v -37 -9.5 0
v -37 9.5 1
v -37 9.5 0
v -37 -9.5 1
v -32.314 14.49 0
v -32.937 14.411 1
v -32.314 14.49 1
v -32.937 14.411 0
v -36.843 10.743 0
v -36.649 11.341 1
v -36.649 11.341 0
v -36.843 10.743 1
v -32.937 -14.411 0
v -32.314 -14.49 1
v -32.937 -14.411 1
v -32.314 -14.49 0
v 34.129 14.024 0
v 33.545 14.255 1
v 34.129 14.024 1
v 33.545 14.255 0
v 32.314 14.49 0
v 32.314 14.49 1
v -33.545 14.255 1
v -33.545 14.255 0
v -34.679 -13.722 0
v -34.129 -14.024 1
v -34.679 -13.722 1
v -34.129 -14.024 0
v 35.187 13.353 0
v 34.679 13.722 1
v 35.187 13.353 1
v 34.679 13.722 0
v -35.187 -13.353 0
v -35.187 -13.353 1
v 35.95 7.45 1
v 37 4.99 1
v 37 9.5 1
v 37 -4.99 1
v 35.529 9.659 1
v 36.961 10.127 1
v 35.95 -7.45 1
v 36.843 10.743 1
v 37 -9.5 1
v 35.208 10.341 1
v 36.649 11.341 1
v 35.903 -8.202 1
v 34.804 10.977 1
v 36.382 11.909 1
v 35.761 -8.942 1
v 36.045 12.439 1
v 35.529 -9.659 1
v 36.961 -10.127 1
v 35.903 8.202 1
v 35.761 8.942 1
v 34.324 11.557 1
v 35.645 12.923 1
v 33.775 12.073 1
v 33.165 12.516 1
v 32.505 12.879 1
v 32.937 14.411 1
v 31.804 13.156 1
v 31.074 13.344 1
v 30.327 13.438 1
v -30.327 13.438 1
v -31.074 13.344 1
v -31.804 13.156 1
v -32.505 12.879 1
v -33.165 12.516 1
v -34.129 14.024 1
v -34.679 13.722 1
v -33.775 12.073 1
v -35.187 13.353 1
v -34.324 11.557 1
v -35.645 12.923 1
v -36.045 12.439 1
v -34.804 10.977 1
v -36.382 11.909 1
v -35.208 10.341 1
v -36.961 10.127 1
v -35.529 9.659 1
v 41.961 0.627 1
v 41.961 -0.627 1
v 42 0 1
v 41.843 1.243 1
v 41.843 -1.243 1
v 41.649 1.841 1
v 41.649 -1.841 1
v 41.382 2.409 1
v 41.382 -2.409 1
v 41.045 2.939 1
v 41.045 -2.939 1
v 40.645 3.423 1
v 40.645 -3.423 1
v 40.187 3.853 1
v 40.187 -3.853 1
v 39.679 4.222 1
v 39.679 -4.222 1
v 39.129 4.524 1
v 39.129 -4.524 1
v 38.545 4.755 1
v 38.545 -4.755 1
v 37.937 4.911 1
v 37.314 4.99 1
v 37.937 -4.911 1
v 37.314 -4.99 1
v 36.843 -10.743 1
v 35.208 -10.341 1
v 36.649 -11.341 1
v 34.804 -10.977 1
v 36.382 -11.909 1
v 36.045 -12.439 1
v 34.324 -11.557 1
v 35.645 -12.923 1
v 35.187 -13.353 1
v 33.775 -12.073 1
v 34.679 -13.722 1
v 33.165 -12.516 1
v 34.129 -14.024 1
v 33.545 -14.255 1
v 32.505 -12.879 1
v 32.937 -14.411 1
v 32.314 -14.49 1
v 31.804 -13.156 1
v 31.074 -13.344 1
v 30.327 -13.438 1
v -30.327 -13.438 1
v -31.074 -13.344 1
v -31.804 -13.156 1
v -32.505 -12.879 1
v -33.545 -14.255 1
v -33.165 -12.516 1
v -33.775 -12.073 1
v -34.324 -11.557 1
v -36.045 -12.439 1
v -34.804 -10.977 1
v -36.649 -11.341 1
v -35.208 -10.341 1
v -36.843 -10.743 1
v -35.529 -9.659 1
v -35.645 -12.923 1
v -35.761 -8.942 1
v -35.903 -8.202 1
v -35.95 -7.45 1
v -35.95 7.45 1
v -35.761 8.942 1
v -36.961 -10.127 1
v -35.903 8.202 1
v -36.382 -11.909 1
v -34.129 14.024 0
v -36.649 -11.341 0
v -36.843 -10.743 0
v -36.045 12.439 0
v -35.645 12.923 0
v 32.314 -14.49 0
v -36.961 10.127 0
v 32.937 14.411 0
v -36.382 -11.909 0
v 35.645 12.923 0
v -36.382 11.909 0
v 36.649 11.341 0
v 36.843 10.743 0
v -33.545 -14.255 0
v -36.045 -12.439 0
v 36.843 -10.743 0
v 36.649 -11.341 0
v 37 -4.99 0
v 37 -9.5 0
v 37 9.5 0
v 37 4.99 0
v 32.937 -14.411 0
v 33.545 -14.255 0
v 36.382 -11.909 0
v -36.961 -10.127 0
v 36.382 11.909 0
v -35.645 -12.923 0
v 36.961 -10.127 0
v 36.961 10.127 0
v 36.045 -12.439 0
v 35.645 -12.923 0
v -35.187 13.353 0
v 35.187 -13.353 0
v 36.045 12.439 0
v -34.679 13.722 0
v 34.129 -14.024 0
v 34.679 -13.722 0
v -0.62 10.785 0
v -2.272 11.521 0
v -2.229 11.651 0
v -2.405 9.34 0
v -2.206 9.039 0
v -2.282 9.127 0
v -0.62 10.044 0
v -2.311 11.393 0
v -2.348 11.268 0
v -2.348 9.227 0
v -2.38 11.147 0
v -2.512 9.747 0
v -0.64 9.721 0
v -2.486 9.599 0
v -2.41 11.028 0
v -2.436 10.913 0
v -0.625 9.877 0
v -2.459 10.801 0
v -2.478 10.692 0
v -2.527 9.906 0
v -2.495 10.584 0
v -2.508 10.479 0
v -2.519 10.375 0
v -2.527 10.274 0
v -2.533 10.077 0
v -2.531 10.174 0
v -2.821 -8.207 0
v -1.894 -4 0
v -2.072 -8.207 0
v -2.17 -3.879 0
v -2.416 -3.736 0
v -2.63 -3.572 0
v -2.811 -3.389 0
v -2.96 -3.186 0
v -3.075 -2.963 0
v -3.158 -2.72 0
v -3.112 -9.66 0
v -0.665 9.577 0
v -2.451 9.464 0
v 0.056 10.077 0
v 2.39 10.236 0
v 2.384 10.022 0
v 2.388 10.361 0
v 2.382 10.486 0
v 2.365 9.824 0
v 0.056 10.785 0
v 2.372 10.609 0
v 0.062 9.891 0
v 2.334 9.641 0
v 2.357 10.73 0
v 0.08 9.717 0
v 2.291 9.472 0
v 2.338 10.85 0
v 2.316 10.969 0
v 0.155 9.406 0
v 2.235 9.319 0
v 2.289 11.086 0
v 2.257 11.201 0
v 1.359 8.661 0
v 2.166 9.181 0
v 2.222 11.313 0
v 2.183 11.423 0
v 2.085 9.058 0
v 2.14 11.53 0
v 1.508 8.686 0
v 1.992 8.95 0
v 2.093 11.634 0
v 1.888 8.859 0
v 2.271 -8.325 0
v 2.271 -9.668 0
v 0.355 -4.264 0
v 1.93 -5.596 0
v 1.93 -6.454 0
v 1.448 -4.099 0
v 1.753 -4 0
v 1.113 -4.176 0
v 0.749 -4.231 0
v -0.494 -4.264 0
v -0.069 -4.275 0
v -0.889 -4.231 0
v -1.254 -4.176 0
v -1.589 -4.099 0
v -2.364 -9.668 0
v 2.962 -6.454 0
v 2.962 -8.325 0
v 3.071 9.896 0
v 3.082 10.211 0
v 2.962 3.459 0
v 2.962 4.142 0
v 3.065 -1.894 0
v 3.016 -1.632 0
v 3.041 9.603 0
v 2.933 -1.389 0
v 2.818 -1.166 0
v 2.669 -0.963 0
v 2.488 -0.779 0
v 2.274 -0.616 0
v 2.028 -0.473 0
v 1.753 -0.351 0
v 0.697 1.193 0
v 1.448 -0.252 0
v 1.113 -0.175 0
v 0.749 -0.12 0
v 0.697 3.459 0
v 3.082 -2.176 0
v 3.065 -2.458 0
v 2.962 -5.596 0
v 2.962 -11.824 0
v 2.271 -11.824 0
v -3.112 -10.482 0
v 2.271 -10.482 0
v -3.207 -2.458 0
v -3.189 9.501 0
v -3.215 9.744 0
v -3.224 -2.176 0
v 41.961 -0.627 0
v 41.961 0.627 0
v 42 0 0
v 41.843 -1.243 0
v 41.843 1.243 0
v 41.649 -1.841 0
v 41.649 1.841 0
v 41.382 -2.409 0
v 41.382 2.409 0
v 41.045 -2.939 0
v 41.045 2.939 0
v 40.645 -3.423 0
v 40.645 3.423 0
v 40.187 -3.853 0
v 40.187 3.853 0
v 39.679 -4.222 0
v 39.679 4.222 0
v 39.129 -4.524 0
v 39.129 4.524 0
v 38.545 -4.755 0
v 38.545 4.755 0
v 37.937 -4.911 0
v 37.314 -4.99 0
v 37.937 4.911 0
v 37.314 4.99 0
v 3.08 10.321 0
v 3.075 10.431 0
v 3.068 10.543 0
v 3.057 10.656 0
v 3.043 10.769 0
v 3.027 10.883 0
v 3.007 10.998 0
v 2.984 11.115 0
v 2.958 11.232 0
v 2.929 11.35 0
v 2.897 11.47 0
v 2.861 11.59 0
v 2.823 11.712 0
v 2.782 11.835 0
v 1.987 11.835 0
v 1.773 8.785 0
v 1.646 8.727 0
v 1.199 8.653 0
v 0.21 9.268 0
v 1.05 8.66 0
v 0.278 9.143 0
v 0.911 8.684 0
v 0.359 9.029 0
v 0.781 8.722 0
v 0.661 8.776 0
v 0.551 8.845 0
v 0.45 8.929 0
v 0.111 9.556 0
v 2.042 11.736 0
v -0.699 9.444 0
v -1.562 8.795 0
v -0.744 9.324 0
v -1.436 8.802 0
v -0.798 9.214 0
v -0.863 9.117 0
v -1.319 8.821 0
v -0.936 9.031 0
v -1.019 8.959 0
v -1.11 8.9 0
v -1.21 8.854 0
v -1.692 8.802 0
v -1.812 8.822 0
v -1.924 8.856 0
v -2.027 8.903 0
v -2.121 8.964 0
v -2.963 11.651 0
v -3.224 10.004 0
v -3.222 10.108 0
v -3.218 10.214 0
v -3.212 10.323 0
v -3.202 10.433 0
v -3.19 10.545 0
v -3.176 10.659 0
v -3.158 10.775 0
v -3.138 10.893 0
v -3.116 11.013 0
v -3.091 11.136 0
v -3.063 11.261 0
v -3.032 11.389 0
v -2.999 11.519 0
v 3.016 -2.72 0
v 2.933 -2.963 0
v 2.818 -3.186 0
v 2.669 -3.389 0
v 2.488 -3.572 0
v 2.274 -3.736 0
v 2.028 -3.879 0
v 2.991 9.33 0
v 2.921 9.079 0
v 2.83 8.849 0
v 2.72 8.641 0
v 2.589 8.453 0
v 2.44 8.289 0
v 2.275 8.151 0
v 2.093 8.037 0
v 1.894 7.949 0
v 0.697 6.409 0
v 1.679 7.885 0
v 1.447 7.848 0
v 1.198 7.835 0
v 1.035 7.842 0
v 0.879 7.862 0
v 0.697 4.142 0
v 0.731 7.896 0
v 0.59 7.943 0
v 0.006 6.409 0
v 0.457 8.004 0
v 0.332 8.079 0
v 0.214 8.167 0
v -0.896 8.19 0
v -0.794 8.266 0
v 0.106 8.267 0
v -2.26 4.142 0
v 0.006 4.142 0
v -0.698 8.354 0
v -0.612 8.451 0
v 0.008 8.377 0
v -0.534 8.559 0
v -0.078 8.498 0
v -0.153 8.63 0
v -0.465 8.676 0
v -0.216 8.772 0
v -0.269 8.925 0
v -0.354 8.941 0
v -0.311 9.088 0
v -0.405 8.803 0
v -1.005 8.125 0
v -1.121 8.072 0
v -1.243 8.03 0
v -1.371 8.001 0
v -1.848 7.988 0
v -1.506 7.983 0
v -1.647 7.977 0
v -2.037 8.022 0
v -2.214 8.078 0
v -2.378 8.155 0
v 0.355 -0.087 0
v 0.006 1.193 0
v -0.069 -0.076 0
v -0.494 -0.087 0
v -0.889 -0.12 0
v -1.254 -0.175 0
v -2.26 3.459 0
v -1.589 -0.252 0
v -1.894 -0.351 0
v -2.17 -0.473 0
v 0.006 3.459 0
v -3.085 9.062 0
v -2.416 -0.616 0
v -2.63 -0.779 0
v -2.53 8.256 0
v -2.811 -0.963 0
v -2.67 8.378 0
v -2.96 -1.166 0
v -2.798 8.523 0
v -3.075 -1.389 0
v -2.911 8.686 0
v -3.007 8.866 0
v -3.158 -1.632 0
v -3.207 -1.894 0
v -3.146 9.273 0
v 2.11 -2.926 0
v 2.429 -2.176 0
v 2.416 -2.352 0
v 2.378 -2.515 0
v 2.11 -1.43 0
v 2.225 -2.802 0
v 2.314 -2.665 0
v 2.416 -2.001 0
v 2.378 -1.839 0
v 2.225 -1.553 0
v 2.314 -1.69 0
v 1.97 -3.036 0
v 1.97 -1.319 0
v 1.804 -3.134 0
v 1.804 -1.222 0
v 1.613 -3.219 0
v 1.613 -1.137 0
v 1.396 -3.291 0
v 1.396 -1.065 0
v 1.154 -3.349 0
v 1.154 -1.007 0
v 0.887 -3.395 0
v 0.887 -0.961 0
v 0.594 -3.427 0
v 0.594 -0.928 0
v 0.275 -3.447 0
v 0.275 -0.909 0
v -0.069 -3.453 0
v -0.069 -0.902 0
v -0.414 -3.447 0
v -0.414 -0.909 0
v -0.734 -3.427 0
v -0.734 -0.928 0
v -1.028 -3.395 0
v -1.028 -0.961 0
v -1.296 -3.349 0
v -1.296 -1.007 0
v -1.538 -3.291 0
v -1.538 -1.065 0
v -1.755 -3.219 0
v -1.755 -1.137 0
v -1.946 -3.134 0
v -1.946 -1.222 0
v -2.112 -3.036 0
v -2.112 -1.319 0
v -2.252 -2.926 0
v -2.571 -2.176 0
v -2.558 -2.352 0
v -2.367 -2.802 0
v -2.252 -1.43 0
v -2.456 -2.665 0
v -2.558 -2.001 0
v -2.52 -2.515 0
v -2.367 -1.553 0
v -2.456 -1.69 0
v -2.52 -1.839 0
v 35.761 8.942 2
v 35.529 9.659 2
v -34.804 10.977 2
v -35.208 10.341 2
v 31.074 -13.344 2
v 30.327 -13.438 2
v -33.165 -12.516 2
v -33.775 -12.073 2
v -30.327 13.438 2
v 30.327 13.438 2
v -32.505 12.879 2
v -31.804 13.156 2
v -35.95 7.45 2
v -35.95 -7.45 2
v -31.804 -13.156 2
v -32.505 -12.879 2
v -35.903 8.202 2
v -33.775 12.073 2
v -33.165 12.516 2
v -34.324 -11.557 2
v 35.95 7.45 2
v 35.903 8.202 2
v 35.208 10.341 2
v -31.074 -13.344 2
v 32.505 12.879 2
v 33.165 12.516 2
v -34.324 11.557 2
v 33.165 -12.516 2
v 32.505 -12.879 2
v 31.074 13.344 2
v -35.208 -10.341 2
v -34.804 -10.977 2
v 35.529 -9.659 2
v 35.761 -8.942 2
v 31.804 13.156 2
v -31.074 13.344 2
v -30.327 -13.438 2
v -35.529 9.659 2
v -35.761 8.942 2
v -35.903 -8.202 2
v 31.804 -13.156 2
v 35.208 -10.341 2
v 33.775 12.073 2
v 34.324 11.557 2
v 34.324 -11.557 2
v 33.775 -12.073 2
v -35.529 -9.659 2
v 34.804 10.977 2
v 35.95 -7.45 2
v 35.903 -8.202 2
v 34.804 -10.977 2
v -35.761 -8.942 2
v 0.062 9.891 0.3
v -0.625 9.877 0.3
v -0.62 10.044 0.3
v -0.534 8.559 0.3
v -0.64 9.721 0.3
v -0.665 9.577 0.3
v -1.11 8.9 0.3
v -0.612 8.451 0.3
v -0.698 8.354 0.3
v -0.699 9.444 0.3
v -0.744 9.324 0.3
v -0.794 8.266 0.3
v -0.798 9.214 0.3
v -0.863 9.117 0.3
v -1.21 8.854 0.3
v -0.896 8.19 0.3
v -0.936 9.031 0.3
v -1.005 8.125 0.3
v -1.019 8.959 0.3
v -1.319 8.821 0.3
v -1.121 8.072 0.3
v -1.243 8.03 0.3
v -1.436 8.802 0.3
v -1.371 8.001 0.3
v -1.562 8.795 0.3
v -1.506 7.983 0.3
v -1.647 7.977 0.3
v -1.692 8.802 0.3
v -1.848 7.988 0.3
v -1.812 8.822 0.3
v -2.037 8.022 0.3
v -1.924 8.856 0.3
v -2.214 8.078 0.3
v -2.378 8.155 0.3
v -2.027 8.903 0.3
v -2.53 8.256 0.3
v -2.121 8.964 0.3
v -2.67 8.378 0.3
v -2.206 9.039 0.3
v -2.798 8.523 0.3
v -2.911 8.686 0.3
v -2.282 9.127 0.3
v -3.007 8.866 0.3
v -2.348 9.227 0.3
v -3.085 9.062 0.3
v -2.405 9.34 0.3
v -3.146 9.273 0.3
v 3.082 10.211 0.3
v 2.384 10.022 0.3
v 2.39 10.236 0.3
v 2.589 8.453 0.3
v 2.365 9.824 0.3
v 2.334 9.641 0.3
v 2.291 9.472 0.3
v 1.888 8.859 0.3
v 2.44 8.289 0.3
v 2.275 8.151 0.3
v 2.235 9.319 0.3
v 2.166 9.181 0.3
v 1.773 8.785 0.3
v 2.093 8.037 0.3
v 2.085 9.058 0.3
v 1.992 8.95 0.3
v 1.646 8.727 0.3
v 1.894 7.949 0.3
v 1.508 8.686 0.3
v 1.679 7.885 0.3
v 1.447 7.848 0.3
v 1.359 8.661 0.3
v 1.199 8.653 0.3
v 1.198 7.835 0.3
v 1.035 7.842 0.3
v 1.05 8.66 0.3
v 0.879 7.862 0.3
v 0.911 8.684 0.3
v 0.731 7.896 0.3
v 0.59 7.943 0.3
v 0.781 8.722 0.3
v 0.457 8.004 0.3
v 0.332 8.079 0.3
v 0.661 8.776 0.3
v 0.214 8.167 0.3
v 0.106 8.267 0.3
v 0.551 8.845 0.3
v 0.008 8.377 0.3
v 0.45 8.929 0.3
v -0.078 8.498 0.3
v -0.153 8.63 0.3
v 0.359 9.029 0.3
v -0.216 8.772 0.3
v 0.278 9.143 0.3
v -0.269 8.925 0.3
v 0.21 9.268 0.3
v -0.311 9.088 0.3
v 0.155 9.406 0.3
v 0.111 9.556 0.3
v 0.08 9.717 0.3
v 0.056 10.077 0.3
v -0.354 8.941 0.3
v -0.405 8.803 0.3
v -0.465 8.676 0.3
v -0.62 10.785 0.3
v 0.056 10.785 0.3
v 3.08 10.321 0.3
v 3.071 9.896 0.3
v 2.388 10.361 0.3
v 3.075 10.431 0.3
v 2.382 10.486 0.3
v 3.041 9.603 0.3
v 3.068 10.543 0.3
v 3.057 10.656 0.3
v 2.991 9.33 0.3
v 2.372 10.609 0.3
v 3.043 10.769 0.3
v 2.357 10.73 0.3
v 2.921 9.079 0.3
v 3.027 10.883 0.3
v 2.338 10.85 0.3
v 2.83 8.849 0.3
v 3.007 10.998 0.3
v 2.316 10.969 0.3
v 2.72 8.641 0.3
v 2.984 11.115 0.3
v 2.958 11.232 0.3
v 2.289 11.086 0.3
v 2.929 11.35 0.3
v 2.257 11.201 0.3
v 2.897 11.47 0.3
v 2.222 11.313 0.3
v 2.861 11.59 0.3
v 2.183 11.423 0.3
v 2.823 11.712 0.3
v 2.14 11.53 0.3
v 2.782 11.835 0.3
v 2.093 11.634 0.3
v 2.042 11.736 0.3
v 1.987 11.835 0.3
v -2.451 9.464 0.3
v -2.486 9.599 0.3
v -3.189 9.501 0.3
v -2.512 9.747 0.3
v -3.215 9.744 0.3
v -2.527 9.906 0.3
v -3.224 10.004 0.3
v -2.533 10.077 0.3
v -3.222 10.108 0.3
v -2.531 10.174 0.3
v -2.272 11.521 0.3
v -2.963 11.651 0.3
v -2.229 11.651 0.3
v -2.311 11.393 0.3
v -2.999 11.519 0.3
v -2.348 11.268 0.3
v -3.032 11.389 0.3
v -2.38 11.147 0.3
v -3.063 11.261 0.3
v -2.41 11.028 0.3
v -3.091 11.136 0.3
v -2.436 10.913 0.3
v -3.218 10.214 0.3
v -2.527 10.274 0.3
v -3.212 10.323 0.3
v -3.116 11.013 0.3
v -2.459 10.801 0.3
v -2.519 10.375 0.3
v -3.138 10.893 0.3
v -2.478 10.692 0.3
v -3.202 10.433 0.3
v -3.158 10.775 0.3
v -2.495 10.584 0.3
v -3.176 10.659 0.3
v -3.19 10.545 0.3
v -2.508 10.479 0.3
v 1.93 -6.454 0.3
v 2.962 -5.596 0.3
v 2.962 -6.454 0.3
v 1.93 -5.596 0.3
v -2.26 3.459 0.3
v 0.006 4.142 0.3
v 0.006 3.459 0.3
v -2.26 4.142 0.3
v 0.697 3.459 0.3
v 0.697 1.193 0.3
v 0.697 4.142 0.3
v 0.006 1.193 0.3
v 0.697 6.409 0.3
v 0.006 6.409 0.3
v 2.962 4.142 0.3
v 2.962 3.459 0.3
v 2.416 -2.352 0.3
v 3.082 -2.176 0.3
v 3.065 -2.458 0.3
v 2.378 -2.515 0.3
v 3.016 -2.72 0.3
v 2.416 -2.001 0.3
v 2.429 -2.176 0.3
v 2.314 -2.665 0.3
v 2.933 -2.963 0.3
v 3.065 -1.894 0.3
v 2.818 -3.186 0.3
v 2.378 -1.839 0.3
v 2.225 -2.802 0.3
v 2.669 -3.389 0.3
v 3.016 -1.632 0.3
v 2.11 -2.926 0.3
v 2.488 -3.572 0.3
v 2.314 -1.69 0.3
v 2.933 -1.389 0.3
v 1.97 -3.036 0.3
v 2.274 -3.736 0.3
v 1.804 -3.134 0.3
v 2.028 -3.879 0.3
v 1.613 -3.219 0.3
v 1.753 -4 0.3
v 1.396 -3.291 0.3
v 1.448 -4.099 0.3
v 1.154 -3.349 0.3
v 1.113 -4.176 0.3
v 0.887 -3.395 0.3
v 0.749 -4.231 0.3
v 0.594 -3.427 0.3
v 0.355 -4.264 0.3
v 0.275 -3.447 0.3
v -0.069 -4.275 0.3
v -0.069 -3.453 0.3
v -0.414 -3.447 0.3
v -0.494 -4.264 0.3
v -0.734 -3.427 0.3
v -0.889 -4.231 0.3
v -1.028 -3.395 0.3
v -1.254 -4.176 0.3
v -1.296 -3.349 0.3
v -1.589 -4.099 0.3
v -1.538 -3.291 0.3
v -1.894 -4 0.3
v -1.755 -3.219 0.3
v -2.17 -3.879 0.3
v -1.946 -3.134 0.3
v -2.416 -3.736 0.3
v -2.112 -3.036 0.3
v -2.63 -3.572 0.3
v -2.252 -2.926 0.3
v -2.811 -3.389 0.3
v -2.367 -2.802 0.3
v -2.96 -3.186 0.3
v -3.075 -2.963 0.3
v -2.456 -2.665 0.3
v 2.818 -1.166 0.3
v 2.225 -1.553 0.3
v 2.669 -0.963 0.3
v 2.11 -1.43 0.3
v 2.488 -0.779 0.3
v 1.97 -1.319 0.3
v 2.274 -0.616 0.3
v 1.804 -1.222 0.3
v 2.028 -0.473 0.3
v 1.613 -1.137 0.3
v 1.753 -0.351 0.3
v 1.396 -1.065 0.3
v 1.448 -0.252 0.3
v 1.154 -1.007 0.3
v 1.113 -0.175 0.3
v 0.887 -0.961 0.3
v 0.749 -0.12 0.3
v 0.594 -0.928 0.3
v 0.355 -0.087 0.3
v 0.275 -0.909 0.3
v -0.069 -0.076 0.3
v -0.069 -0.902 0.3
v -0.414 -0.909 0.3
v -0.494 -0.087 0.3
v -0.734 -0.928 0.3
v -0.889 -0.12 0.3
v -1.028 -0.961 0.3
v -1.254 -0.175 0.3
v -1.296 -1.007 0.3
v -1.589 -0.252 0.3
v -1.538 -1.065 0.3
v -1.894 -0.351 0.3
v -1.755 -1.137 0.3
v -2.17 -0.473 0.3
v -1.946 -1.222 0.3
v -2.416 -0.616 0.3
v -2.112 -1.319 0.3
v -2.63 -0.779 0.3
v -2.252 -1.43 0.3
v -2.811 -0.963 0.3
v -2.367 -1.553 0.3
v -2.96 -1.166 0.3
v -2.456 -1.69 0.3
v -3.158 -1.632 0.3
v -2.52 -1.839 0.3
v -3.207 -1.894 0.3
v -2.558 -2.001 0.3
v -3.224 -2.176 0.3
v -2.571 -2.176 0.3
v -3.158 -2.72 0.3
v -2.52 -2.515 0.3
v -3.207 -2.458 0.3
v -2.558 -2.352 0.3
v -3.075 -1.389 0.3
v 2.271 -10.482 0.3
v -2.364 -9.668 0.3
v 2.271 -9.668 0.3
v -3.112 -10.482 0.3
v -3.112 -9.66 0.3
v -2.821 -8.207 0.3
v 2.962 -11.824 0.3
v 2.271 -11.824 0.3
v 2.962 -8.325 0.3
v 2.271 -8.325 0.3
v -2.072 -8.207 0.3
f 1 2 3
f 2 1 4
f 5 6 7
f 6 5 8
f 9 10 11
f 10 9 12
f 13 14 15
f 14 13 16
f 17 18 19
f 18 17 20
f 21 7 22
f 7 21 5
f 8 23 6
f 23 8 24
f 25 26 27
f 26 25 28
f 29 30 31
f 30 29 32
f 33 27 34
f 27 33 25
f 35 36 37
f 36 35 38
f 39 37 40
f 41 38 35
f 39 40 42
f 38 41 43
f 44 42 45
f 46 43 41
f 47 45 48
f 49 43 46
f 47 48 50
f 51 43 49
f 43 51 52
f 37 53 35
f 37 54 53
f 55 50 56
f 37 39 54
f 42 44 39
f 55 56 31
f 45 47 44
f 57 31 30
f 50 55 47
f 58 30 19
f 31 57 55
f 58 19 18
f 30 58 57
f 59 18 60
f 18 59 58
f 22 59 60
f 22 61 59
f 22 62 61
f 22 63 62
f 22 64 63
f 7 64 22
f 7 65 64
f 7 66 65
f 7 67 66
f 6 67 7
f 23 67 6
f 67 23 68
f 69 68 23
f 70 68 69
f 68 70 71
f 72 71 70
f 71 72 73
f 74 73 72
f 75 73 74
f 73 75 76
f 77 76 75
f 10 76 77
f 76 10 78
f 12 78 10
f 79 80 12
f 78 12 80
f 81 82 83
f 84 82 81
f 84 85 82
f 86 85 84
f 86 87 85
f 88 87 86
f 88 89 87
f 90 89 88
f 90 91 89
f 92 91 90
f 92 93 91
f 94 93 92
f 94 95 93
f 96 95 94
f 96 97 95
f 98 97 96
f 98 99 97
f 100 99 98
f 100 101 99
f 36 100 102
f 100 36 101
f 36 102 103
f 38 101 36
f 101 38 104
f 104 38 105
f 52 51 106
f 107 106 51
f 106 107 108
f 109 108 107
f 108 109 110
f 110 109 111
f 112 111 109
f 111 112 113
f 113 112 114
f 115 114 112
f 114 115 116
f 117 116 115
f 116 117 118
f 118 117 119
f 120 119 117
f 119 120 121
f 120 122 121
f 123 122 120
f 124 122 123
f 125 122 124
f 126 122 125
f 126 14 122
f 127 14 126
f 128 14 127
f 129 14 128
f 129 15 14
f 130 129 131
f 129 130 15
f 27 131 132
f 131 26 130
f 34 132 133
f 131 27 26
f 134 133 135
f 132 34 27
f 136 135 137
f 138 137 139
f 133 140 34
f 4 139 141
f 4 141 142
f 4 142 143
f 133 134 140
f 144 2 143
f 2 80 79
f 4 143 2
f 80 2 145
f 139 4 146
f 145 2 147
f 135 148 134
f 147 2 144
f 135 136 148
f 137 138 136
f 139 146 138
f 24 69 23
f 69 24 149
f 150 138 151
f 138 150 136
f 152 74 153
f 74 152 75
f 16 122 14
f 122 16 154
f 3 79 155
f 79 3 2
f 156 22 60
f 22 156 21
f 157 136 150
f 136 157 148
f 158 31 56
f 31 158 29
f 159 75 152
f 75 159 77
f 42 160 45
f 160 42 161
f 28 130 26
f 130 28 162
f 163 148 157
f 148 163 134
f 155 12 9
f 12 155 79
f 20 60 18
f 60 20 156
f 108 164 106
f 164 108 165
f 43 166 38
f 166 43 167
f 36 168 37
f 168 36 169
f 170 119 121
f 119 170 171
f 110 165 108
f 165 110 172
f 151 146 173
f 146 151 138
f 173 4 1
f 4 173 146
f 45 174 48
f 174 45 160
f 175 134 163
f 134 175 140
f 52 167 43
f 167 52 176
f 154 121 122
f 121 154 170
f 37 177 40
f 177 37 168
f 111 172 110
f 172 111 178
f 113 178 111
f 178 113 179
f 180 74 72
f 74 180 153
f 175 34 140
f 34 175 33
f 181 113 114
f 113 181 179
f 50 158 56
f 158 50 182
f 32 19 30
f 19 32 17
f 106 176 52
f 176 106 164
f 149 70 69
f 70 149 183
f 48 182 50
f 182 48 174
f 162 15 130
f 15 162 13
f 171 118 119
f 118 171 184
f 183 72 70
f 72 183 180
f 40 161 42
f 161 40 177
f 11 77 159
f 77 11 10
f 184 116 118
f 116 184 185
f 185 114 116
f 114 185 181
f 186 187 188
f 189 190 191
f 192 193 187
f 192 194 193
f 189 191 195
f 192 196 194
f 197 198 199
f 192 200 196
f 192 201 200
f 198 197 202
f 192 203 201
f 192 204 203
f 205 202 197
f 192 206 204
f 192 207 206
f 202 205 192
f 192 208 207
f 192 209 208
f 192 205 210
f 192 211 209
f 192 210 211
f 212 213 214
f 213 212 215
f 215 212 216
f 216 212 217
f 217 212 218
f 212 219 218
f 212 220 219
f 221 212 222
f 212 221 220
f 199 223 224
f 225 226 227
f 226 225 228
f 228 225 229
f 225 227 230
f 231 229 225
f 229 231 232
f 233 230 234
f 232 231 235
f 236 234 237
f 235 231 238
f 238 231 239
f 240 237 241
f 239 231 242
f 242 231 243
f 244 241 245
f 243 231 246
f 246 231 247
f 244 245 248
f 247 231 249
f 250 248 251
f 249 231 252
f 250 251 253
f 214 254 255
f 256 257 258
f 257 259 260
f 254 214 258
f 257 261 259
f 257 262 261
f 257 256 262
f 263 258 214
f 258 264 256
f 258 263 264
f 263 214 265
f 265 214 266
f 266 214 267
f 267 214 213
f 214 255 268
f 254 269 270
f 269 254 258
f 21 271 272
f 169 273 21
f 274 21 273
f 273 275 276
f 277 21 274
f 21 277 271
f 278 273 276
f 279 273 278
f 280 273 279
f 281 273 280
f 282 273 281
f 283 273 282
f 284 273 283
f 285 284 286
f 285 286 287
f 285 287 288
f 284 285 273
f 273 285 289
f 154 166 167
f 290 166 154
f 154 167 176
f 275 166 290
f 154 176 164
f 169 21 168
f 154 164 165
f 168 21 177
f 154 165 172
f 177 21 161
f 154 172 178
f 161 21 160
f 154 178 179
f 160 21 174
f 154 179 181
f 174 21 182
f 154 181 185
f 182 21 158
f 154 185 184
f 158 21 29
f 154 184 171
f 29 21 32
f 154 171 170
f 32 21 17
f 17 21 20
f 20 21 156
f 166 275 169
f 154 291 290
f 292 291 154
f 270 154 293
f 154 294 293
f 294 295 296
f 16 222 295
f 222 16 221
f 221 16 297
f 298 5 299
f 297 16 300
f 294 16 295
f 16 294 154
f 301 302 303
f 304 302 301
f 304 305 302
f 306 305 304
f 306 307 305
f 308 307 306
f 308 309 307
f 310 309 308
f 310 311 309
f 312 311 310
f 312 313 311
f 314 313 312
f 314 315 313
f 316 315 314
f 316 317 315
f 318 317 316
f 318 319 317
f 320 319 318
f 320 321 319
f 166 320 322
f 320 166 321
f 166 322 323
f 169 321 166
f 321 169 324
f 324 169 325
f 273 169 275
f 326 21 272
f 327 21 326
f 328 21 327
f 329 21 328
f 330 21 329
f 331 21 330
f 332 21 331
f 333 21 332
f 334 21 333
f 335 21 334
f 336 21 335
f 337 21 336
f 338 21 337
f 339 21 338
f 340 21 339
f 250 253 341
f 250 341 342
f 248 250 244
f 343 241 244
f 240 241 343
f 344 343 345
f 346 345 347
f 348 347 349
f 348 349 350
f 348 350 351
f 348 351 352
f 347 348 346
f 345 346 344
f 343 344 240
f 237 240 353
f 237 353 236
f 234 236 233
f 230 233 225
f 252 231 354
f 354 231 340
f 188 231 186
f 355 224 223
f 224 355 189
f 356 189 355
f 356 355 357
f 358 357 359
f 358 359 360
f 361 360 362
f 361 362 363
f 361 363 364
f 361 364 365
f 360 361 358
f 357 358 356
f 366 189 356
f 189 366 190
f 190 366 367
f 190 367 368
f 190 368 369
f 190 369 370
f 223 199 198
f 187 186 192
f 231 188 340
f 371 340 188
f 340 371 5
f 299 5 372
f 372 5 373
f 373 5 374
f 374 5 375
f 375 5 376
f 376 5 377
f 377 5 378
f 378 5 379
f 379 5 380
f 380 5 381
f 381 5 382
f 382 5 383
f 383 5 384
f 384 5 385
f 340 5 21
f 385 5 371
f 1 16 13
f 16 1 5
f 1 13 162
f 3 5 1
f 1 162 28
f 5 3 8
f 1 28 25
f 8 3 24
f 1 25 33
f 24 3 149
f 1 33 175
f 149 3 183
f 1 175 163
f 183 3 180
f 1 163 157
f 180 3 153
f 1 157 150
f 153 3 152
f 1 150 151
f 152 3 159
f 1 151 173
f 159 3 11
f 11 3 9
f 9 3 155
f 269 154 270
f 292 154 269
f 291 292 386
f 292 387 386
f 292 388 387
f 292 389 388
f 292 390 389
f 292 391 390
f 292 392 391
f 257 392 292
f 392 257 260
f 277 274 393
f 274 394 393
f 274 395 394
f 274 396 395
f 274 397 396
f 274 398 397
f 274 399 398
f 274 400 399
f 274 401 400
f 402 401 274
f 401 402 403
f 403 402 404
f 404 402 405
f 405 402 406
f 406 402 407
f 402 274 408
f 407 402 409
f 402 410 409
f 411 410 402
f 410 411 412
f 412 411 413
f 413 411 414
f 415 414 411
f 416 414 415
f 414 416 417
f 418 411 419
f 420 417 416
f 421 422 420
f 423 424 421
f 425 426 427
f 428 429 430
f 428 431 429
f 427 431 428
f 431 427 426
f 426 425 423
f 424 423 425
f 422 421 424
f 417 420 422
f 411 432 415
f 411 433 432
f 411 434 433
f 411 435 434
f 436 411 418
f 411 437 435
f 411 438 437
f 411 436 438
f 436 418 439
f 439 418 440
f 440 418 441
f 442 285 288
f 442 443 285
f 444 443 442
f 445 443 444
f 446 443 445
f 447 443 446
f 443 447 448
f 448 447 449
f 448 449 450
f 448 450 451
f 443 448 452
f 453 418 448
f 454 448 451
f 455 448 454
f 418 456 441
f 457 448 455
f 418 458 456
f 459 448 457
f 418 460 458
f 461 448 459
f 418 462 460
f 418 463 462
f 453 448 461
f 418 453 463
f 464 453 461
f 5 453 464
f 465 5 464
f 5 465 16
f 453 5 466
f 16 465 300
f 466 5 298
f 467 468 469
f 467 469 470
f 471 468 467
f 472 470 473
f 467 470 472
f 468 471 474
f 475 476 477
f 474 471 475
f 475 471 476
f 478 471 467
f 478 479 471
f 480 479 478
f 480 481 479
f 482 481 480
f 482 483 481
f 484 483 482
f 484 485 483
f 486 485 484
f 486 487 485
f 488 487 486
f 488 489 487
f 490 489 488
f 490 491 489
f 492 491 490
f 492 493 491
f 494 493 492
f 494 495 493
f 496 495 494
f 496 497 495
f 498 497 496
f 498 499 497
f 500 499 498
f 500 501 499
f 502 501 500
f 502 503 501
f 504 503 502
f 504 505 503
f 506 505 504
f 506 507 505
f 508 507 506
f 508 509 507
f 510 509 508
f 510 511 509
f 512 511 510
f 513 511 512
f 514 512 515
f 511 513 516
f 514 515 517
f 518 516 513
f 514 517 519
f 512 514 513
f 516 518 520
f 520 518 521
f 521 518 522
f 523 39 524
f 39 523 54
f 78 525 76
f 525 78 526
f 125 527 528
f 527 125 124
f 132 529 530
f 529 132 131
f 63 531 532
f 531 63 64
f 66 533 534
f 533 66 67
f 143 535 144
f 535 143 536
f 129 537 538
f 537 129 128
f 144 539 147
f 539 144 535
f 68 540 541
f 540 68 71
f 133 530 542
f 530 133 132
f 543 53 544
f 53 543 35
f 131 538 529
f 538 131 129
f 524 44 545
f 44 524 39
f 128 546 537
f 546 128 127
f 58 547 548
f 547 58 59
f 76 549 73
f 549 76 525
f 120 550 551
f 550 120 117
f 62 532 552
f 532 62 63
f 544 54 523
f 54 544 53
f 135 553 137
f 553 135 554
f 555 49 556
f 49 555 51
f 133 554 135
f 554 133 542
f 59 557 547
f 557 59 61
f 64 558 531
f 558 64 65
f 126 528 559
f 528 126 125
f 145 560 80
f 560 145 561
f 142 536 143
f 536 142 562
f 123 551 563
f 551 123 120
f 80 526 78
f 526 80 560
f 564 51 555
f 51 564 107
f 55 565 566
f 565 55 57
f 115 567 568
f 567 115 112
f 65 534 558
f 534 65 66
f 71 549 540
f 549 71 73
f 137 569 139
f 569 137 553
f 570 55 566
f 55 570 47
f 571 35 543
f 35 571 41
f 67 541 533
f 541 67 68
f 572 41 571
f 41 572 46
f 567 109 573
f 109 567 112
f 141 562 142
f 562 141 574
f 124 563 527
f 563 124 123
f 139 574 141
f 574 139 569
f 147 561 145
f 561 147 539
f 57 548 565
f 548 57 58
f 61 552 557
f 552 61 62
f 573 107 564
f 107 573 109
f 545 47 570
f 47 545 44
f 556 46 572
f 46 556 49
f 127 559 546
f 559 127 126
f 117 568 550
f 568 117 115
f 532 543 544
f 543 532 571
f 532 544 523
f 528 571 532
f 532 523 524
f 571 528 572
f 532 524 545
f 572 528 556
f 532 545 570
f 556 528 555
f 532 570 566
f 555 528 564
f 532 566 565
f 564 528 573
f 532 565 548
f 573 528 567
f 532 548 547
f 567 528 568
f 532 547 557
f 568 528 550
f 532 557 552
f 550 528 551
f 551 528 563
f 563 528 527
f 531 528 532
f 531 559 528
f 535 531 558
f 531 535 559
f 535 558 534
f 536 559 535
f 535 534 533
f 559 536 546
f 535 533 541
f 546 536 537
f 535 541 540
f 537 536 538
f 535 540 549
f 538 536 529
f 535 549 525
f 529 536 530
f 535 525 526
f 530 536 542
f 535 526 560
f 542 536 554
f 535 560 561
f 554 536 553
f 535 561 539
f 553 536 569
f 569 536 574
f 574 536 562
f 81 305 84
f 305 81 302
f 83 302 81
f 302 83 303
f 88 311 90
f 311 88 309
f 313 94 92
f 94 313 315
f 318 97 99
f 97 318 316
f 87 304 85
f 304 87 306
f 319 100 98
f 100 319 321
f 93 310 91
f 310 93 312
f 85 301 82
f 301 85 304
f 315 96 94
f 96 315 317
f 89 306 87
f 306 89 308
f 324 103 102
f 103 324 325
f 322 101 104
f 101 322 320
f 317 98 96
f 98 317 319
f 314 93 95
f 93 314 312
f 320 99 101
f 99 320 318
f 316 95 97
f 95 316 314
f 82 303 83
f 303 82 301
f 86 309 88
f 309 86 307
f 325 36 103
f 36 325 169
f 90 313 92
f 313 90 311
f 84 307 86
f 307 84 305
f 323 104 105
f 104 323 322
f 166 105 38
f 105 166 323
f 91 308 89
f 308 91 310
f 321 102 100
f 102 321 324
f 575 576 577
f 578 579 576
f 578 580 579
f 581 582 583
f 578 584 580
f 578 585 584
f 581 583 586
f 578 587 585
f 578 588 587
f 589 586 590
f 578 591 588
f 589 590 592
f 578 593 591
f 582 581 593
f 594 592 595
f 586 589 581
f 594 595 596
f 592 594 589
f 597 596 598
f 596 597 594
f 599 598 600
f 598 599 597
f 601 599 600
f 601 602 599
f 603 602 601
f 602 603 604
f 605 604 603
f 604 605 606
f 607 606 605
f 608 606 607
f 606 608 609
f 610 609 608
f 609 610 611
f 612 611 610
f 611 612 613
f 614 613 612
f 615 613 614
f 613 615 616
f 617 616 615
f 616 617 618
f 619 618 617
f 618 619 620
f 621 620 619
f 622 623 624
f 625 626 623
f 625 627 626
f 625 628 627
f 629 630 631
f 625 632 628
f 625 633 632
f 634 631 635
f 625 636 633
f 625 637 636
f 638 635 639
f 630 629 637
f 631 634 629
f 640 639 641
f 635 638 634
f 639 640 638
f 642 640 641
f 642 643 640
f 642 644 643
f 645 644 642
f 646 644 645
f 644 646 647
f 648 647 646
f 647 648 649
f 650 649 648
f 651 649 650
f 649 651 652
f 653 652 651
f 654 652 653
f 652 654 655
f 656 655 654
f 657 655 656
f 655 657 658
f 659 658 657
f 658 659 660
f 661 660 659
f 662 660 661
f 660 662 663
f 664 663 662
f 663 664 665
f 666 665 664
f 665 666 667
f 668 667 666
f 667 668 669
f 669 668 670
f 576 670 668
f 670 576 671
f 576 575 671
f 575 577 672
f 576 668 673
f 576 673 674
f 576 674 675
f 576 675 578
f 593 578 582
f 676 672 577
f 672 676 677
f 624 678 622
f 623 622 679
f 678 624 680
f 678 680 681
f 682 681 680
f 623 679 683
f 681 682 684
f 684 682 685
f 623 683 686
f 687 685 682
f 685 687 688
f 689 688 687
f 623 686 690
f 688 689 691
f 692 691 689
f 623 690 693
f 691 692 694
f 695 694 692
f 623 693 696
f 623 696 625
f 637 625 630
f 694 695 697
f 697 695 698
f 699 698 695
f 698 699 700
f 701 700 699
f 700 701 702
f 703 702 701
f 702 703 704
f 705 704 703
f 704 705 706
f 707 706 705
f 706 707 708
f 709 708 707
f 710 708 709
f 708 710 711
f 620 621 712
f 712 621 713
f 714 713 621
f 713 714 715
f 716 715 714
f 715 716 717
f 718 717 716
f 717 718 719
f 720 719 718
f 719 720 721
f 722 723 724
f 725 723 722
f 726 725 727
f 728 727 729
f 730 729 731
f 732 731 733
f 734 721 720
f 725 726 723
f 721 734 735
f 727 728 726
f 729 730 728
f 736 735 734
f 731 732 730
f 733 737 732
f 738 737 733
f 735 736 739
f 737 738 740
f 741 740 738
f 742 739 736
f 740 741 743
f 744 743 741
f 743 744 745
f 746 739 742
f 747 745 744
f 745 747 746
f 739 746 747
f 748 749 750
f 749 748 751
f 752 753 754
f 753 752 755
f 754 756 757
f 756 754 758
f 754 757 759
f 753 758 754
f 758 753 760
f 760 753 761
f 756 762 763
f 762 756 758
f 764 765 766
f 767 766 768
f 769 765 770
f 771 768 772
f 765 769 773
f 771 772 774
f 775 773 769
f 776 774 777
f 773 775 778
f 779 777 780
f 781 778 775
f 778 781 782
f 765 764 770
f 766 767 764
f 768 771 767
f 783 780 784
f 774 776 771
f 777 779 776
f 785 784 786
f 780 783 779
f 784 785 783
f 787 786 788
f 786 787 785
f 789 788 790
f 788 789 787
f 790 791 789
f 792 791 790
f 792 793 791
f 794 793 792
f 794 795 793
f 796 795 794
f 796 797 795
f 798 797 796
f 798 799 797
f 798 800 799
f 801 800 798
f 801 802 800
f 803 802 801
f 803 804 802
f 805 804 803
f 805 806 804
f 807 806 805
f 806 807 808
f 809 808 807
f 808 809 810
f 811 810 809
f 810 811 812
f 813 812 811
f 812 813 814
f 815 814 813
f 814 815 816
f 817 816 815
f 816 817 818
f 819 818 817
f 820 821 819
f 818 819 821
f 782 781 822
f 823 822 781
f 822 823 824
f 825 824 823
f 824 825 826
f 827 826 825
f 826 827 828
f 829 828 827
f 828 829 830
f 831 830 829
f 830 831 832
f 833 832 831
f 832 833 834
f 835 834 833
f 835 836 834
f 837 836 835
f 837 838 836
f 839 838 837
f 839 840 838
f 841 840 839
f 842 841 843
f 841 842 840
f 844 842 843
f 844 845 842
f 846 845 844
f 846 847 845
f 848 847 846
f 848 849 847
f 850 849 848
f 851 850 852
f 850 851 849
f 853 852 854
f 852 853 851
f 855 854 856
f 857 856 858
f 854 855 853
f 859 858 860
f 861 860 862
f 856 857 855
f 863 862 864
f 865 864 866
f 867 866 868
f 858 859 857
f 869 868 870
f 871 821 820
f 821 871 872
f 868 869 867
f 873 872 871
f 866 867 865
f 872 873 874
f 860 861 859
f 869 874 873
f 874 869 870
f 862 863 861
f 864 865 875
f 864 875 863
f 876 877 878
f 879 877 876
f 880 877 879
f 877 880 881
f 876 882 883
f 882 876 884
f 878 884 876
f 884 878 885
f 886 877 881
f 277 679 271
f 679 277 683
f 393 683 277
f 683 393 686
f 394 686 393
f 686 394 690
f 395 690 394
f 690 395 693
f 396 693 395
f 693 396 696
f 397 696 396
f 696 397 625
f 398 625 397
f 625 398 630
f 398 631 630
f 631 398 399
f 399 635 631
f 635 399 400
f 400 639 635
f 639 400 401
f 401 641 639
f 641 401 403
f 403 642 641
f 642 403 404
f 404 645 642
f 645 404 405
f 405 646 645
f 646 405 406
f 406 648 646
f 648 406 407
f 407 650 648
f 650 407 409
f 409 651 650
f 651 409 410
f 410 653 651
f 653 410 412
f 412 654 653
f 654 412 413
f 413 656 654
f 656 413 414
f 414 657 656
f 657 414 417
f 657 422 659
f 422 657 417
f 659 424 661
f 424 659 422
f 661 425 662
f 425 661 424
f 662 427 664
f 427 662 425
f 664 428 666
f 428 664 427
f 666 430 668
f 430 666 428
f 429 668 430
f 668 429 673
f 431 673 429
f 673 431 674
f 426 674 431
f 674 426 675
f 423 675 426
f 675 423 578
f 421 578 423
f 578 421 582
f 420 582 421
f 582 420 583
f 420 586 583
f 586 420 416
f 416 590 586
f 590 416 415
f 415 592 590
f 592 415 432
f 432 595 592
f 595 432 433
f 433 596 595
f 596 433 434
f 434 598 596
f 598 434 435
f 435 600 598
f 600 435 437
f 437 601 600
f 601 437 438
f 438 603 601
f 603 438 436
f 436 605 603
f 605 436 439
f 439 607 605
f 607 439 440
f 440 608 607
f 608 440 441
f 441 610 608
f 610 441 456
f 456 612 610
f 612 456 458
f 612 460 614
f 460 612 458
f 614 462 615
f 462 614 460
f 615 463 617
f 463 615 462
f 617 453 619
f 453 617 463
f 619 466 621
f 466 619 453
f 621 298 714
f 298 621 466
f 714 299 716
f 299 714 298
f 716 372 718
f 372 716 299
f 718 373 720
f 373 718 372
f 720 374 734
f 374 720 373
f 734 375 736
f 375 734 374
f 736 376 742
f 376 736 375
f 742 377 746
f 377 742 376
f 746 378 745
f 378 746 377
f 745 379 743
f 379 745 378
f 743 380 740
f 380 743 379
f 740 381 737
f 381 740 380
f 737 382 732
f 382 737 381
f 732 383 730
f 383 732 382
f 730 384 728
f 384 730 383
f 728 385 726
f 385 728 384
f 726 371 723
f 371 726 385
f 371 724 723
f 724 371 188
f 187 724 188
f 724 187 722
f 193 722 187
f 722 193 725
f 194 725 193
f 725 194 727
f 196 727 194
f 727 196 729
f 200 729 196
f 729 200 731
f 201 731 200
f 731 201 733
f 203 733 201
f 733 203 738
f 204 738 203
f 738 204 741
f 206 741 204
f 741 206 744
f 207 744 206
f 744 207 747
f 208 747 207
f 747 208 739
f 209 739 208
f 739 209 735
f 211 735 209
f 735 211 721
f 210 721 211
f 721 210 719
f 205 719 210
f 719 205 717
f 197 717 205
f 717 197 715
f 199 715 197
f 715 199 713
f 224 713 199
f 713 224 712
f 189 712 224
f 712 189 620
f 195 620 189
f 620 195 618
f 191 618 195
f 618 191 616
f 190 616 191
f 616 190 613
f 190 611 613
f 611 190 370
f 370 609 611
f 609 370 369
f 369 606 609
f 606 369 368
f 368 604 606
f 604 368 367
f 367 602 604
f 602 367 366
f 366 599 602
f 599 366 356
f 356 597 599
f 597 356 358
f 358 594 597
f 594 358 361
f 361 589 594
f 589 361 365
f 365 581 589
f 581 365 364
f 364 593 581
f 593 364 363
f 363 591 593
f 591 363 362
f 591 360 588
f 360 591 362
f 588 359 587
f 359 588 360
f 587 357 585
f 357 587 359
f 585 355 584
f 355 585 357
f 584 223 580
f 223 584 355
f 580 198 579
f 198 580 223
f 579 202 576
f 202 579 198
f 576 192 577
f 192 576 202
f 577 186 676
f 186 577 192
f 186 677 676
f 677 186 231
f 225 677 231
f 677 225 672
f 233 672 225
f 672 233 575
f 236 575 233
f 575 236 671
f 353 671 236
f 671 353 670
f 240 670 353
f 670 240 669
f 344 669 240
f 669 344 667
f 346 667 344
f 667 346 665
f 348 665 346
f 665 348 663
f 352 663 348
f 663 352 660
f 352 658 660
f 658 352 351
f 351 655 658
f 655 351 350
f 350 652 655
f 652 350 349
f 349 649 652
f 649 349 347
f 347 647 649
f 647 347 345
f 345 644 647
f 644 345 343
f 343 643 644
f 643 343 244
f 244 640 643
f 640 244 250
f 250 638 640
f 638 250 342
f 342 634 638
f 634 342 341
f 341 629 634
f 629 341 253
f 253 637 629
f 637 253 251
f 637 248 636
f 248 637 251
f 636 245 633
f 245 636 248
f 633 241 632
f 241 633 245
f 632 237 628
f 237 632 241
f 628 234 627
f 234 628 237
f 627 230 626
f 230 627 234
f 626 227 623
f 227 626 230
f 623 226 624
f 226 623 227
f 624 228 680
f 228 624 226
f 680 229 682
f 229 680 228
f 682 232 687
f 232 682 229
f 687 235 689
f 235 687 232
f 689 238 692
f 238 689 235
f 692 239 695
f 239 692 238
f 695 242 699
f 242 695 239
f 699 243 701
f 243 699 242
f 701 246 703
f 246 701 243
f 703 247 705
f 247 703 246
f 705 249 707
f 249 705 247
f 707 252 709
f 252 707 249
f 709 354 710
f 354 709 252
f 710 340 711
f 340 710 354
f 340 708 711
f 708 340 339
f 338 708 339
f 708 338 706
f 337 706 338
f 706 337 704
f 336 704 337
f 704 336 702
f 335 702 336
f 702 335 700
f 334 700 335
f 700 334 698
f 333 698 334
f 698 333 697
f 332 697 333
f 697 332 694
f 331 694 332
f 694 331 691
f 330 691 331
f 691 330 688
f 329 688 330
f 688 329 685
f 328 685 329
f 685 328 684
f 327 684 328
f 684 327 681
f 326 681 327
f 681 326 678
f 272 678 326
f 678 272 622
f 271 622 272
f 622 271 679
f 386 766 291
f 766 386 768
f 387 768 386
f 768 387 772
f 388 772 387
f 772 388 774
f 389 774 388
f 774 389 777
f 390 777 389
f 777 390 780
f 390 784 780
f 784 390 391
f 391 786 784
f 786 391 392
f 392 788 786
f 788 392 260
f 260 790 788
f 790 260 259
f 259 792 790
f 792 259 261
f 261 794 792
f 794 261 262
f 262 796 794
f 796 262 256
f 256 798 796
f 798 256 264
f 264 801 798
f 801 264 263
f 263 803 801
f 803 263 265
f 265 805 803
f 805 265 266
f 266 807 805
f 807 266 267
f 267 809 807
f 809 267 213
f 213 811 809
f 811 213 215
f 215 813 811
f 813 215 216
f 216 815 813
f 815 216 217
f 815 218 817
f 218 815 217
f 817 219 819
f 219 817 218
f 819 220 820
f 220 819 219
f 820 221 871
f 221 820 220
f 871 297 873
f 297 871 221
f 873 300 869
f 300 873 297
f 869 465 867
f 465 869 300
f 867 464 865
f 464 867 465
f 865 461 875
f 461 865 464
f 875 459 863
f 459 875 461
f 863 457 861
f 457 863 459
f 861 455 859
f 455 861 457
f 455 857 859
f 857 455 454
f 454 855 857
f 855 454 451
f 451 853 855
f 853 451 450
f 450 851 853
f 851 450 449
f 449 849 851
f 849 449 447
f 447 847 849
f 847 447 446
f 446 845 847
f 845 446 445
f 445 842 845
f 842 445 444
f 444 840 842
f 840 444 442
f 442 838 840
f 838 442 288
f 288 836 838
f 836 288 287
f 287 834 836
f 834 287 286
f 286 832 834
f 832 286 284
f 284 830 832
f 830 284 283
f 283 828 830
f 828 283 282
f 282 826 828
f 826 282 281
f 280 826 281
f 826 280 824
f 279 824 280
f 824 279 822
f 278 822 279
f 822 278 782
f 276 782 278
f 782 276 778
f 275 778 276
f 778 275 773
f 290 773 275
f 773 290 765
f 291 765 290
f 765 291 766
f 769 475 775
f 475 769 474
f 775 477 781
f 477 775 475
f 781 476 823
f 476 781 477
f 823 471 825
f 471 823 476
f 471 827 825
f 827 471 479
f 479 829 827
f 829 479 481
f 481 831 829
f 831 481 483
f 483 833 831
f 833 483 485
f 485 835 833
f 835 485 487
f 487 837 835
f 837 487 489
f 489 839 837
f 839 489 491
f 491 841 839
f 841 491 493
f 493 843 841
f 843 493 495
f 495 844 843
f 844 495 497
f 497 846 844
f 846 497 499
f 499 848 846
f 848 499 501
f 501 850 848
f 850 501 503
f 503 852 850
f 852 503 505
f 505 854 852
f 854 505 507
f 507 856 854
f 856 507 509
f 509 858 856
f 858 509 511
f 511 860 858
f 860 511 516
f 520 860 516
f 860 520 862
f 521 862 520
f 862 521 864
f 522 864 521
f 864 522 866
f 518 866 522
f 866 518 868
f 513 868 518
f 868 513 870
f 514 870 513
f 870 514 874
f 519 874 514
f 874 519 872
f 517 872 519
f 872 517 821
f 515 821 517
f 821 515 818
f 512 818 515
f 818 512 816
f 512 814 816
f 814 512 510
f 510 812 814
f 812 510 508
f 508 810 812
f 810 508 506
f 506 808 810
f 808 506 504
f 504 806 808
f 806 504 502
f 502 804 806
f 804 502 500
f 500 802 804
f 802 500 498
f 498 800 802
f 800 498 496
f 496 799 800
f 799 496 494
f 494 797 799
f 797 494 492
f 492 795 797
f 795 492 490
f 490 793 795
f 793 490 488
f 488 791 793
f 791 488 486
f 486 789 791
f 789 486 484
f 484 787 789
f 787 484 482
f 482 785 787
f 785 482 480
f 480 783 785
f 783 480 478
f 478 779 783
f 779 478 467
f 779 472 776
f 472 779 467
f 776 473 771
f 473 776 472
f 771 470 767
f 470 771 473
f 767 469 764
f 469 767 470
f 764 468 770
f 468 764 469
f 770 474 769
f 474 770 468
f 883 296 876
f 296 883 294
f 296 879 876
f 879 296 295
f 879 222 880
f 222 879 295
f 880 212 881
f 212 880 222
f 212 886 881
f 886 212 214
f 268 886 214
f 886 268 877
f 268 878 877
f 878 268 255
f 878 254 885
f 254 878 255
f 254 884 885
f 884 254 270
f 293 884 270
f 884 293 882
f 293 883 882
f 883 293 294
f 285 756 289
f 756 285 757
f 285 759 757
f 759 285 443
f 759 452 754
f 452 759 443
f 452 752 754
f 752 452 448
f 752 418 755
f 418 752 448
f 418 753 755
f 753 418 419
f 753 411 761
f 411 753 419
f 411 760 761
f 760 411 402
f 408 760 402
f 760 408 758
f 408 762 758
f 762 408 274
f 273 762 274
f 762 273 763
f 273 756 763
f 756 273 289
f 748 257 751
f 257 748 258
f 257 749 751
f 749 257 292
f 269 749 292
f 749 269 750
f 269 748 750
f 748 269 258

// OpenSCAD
$fn = 50;


difference() {
	union() {
		translate(v = [0, 0, 0]) {
			rotate(a = [0, 0, 0]) {
				hull() {
					translate(v = [-32.0000000000, 9.5000000000, 0]) {
						rotate(a = [0, 0, 0]) {
							translate(v = [0, 0, 0]) {
								rotate(a = [0, 0, 0]) {
									cylinder(h = 1, r = 5);
								}
							}
						}
					}
					translate(v = [32.0000000000, 9.5000000000, 0]) {
						rotate(a = [0, 0, 0]) {
							translate(v = [0, 0, 0]) {
								rotate(a = [0, 0, 0]) {
									cylinder(h = 1, r = 5);
								}
							}
						}
					}
					translate(v = [-32.0000000000, -9.5000000000, 0]) {
						rotate(a = [0, 0, 0]) {
							translate(v = [0, 0, 0]) {
								rotate(a = [0, 0, 0]) {
									cylinder(h = 1, r = 5);
								}
							}
						}
					}
					translate(v = [32.0000000000, -9.5000000000, 0]) {
						rotate(a = [0, 0, 0]) {
							translate(v = [0, 0, 0]) {
								rotate(a = [0, 0, 0]) {
									cylinder(h = 1, r = 5);
								}
							}
						}
					}
				}
			}
		}
		translate(v = [0, 0, 0]) {
			rotate(a = [0, 0, 0]) {
				hull() {
					translate(v = [-29.9500000000, 7.4500000000, 0]) {
						rotate(a = [0, 0, 0]) {
							translate(v = [0, 0, 0]) {
								rotate(a = [0, 0, 0]) {
									cylinder(h = 2, r = 6);
								}
							}
						}
					}
					translate(v = [29.9500000000, 7.4500000000, 0]) {
						rotate(a = [0, 0, 0]) {
							translate(v = [0, 0, 0]) {
								rotate(a = [0, 0, 0]) {
									cylinder(h = 2, r = 6);
								}
							}
						}
					}
					translate(v = [-29.9500000000, -7.4500000000, 0]) {
						rotate(a = [0, 0, 0]) {
							translate(v = [0, 0, 0]) {
								rotate(a = [0, 0, 0]) {
									cylinder(h = 2, r = 6);
								}
							}
						}
					}
					translate(v = [29.9500000000, -7.4500000000, 0]) {
						rotate(a = [0, 0, 0]) {
							translate(v = [0, 0, 0]) {
								rotate(a = [0, 0, 0]) {
									cylinder(h = 2, r = 6);
								}
							}
						}
					}
				}
			}
		}
		translate(v = [37.0000000000, 0, 0.0000000000]) {
			rotate(a = [0, 0, 0]) {
				cylinder(h = 1, r = 5);
			}
		}
	}
	union() {
		translate(v = [0, 0, 0.3000000000]) {
			rotate(a = [0, 180, 90]) {
				linear_extrude(height = 0.3000000000) {
					text(font = "Candara:Light", halign = "center", size = 6, text = "3+0.1", valign = "center");
				}
			}
		}
	}
}
